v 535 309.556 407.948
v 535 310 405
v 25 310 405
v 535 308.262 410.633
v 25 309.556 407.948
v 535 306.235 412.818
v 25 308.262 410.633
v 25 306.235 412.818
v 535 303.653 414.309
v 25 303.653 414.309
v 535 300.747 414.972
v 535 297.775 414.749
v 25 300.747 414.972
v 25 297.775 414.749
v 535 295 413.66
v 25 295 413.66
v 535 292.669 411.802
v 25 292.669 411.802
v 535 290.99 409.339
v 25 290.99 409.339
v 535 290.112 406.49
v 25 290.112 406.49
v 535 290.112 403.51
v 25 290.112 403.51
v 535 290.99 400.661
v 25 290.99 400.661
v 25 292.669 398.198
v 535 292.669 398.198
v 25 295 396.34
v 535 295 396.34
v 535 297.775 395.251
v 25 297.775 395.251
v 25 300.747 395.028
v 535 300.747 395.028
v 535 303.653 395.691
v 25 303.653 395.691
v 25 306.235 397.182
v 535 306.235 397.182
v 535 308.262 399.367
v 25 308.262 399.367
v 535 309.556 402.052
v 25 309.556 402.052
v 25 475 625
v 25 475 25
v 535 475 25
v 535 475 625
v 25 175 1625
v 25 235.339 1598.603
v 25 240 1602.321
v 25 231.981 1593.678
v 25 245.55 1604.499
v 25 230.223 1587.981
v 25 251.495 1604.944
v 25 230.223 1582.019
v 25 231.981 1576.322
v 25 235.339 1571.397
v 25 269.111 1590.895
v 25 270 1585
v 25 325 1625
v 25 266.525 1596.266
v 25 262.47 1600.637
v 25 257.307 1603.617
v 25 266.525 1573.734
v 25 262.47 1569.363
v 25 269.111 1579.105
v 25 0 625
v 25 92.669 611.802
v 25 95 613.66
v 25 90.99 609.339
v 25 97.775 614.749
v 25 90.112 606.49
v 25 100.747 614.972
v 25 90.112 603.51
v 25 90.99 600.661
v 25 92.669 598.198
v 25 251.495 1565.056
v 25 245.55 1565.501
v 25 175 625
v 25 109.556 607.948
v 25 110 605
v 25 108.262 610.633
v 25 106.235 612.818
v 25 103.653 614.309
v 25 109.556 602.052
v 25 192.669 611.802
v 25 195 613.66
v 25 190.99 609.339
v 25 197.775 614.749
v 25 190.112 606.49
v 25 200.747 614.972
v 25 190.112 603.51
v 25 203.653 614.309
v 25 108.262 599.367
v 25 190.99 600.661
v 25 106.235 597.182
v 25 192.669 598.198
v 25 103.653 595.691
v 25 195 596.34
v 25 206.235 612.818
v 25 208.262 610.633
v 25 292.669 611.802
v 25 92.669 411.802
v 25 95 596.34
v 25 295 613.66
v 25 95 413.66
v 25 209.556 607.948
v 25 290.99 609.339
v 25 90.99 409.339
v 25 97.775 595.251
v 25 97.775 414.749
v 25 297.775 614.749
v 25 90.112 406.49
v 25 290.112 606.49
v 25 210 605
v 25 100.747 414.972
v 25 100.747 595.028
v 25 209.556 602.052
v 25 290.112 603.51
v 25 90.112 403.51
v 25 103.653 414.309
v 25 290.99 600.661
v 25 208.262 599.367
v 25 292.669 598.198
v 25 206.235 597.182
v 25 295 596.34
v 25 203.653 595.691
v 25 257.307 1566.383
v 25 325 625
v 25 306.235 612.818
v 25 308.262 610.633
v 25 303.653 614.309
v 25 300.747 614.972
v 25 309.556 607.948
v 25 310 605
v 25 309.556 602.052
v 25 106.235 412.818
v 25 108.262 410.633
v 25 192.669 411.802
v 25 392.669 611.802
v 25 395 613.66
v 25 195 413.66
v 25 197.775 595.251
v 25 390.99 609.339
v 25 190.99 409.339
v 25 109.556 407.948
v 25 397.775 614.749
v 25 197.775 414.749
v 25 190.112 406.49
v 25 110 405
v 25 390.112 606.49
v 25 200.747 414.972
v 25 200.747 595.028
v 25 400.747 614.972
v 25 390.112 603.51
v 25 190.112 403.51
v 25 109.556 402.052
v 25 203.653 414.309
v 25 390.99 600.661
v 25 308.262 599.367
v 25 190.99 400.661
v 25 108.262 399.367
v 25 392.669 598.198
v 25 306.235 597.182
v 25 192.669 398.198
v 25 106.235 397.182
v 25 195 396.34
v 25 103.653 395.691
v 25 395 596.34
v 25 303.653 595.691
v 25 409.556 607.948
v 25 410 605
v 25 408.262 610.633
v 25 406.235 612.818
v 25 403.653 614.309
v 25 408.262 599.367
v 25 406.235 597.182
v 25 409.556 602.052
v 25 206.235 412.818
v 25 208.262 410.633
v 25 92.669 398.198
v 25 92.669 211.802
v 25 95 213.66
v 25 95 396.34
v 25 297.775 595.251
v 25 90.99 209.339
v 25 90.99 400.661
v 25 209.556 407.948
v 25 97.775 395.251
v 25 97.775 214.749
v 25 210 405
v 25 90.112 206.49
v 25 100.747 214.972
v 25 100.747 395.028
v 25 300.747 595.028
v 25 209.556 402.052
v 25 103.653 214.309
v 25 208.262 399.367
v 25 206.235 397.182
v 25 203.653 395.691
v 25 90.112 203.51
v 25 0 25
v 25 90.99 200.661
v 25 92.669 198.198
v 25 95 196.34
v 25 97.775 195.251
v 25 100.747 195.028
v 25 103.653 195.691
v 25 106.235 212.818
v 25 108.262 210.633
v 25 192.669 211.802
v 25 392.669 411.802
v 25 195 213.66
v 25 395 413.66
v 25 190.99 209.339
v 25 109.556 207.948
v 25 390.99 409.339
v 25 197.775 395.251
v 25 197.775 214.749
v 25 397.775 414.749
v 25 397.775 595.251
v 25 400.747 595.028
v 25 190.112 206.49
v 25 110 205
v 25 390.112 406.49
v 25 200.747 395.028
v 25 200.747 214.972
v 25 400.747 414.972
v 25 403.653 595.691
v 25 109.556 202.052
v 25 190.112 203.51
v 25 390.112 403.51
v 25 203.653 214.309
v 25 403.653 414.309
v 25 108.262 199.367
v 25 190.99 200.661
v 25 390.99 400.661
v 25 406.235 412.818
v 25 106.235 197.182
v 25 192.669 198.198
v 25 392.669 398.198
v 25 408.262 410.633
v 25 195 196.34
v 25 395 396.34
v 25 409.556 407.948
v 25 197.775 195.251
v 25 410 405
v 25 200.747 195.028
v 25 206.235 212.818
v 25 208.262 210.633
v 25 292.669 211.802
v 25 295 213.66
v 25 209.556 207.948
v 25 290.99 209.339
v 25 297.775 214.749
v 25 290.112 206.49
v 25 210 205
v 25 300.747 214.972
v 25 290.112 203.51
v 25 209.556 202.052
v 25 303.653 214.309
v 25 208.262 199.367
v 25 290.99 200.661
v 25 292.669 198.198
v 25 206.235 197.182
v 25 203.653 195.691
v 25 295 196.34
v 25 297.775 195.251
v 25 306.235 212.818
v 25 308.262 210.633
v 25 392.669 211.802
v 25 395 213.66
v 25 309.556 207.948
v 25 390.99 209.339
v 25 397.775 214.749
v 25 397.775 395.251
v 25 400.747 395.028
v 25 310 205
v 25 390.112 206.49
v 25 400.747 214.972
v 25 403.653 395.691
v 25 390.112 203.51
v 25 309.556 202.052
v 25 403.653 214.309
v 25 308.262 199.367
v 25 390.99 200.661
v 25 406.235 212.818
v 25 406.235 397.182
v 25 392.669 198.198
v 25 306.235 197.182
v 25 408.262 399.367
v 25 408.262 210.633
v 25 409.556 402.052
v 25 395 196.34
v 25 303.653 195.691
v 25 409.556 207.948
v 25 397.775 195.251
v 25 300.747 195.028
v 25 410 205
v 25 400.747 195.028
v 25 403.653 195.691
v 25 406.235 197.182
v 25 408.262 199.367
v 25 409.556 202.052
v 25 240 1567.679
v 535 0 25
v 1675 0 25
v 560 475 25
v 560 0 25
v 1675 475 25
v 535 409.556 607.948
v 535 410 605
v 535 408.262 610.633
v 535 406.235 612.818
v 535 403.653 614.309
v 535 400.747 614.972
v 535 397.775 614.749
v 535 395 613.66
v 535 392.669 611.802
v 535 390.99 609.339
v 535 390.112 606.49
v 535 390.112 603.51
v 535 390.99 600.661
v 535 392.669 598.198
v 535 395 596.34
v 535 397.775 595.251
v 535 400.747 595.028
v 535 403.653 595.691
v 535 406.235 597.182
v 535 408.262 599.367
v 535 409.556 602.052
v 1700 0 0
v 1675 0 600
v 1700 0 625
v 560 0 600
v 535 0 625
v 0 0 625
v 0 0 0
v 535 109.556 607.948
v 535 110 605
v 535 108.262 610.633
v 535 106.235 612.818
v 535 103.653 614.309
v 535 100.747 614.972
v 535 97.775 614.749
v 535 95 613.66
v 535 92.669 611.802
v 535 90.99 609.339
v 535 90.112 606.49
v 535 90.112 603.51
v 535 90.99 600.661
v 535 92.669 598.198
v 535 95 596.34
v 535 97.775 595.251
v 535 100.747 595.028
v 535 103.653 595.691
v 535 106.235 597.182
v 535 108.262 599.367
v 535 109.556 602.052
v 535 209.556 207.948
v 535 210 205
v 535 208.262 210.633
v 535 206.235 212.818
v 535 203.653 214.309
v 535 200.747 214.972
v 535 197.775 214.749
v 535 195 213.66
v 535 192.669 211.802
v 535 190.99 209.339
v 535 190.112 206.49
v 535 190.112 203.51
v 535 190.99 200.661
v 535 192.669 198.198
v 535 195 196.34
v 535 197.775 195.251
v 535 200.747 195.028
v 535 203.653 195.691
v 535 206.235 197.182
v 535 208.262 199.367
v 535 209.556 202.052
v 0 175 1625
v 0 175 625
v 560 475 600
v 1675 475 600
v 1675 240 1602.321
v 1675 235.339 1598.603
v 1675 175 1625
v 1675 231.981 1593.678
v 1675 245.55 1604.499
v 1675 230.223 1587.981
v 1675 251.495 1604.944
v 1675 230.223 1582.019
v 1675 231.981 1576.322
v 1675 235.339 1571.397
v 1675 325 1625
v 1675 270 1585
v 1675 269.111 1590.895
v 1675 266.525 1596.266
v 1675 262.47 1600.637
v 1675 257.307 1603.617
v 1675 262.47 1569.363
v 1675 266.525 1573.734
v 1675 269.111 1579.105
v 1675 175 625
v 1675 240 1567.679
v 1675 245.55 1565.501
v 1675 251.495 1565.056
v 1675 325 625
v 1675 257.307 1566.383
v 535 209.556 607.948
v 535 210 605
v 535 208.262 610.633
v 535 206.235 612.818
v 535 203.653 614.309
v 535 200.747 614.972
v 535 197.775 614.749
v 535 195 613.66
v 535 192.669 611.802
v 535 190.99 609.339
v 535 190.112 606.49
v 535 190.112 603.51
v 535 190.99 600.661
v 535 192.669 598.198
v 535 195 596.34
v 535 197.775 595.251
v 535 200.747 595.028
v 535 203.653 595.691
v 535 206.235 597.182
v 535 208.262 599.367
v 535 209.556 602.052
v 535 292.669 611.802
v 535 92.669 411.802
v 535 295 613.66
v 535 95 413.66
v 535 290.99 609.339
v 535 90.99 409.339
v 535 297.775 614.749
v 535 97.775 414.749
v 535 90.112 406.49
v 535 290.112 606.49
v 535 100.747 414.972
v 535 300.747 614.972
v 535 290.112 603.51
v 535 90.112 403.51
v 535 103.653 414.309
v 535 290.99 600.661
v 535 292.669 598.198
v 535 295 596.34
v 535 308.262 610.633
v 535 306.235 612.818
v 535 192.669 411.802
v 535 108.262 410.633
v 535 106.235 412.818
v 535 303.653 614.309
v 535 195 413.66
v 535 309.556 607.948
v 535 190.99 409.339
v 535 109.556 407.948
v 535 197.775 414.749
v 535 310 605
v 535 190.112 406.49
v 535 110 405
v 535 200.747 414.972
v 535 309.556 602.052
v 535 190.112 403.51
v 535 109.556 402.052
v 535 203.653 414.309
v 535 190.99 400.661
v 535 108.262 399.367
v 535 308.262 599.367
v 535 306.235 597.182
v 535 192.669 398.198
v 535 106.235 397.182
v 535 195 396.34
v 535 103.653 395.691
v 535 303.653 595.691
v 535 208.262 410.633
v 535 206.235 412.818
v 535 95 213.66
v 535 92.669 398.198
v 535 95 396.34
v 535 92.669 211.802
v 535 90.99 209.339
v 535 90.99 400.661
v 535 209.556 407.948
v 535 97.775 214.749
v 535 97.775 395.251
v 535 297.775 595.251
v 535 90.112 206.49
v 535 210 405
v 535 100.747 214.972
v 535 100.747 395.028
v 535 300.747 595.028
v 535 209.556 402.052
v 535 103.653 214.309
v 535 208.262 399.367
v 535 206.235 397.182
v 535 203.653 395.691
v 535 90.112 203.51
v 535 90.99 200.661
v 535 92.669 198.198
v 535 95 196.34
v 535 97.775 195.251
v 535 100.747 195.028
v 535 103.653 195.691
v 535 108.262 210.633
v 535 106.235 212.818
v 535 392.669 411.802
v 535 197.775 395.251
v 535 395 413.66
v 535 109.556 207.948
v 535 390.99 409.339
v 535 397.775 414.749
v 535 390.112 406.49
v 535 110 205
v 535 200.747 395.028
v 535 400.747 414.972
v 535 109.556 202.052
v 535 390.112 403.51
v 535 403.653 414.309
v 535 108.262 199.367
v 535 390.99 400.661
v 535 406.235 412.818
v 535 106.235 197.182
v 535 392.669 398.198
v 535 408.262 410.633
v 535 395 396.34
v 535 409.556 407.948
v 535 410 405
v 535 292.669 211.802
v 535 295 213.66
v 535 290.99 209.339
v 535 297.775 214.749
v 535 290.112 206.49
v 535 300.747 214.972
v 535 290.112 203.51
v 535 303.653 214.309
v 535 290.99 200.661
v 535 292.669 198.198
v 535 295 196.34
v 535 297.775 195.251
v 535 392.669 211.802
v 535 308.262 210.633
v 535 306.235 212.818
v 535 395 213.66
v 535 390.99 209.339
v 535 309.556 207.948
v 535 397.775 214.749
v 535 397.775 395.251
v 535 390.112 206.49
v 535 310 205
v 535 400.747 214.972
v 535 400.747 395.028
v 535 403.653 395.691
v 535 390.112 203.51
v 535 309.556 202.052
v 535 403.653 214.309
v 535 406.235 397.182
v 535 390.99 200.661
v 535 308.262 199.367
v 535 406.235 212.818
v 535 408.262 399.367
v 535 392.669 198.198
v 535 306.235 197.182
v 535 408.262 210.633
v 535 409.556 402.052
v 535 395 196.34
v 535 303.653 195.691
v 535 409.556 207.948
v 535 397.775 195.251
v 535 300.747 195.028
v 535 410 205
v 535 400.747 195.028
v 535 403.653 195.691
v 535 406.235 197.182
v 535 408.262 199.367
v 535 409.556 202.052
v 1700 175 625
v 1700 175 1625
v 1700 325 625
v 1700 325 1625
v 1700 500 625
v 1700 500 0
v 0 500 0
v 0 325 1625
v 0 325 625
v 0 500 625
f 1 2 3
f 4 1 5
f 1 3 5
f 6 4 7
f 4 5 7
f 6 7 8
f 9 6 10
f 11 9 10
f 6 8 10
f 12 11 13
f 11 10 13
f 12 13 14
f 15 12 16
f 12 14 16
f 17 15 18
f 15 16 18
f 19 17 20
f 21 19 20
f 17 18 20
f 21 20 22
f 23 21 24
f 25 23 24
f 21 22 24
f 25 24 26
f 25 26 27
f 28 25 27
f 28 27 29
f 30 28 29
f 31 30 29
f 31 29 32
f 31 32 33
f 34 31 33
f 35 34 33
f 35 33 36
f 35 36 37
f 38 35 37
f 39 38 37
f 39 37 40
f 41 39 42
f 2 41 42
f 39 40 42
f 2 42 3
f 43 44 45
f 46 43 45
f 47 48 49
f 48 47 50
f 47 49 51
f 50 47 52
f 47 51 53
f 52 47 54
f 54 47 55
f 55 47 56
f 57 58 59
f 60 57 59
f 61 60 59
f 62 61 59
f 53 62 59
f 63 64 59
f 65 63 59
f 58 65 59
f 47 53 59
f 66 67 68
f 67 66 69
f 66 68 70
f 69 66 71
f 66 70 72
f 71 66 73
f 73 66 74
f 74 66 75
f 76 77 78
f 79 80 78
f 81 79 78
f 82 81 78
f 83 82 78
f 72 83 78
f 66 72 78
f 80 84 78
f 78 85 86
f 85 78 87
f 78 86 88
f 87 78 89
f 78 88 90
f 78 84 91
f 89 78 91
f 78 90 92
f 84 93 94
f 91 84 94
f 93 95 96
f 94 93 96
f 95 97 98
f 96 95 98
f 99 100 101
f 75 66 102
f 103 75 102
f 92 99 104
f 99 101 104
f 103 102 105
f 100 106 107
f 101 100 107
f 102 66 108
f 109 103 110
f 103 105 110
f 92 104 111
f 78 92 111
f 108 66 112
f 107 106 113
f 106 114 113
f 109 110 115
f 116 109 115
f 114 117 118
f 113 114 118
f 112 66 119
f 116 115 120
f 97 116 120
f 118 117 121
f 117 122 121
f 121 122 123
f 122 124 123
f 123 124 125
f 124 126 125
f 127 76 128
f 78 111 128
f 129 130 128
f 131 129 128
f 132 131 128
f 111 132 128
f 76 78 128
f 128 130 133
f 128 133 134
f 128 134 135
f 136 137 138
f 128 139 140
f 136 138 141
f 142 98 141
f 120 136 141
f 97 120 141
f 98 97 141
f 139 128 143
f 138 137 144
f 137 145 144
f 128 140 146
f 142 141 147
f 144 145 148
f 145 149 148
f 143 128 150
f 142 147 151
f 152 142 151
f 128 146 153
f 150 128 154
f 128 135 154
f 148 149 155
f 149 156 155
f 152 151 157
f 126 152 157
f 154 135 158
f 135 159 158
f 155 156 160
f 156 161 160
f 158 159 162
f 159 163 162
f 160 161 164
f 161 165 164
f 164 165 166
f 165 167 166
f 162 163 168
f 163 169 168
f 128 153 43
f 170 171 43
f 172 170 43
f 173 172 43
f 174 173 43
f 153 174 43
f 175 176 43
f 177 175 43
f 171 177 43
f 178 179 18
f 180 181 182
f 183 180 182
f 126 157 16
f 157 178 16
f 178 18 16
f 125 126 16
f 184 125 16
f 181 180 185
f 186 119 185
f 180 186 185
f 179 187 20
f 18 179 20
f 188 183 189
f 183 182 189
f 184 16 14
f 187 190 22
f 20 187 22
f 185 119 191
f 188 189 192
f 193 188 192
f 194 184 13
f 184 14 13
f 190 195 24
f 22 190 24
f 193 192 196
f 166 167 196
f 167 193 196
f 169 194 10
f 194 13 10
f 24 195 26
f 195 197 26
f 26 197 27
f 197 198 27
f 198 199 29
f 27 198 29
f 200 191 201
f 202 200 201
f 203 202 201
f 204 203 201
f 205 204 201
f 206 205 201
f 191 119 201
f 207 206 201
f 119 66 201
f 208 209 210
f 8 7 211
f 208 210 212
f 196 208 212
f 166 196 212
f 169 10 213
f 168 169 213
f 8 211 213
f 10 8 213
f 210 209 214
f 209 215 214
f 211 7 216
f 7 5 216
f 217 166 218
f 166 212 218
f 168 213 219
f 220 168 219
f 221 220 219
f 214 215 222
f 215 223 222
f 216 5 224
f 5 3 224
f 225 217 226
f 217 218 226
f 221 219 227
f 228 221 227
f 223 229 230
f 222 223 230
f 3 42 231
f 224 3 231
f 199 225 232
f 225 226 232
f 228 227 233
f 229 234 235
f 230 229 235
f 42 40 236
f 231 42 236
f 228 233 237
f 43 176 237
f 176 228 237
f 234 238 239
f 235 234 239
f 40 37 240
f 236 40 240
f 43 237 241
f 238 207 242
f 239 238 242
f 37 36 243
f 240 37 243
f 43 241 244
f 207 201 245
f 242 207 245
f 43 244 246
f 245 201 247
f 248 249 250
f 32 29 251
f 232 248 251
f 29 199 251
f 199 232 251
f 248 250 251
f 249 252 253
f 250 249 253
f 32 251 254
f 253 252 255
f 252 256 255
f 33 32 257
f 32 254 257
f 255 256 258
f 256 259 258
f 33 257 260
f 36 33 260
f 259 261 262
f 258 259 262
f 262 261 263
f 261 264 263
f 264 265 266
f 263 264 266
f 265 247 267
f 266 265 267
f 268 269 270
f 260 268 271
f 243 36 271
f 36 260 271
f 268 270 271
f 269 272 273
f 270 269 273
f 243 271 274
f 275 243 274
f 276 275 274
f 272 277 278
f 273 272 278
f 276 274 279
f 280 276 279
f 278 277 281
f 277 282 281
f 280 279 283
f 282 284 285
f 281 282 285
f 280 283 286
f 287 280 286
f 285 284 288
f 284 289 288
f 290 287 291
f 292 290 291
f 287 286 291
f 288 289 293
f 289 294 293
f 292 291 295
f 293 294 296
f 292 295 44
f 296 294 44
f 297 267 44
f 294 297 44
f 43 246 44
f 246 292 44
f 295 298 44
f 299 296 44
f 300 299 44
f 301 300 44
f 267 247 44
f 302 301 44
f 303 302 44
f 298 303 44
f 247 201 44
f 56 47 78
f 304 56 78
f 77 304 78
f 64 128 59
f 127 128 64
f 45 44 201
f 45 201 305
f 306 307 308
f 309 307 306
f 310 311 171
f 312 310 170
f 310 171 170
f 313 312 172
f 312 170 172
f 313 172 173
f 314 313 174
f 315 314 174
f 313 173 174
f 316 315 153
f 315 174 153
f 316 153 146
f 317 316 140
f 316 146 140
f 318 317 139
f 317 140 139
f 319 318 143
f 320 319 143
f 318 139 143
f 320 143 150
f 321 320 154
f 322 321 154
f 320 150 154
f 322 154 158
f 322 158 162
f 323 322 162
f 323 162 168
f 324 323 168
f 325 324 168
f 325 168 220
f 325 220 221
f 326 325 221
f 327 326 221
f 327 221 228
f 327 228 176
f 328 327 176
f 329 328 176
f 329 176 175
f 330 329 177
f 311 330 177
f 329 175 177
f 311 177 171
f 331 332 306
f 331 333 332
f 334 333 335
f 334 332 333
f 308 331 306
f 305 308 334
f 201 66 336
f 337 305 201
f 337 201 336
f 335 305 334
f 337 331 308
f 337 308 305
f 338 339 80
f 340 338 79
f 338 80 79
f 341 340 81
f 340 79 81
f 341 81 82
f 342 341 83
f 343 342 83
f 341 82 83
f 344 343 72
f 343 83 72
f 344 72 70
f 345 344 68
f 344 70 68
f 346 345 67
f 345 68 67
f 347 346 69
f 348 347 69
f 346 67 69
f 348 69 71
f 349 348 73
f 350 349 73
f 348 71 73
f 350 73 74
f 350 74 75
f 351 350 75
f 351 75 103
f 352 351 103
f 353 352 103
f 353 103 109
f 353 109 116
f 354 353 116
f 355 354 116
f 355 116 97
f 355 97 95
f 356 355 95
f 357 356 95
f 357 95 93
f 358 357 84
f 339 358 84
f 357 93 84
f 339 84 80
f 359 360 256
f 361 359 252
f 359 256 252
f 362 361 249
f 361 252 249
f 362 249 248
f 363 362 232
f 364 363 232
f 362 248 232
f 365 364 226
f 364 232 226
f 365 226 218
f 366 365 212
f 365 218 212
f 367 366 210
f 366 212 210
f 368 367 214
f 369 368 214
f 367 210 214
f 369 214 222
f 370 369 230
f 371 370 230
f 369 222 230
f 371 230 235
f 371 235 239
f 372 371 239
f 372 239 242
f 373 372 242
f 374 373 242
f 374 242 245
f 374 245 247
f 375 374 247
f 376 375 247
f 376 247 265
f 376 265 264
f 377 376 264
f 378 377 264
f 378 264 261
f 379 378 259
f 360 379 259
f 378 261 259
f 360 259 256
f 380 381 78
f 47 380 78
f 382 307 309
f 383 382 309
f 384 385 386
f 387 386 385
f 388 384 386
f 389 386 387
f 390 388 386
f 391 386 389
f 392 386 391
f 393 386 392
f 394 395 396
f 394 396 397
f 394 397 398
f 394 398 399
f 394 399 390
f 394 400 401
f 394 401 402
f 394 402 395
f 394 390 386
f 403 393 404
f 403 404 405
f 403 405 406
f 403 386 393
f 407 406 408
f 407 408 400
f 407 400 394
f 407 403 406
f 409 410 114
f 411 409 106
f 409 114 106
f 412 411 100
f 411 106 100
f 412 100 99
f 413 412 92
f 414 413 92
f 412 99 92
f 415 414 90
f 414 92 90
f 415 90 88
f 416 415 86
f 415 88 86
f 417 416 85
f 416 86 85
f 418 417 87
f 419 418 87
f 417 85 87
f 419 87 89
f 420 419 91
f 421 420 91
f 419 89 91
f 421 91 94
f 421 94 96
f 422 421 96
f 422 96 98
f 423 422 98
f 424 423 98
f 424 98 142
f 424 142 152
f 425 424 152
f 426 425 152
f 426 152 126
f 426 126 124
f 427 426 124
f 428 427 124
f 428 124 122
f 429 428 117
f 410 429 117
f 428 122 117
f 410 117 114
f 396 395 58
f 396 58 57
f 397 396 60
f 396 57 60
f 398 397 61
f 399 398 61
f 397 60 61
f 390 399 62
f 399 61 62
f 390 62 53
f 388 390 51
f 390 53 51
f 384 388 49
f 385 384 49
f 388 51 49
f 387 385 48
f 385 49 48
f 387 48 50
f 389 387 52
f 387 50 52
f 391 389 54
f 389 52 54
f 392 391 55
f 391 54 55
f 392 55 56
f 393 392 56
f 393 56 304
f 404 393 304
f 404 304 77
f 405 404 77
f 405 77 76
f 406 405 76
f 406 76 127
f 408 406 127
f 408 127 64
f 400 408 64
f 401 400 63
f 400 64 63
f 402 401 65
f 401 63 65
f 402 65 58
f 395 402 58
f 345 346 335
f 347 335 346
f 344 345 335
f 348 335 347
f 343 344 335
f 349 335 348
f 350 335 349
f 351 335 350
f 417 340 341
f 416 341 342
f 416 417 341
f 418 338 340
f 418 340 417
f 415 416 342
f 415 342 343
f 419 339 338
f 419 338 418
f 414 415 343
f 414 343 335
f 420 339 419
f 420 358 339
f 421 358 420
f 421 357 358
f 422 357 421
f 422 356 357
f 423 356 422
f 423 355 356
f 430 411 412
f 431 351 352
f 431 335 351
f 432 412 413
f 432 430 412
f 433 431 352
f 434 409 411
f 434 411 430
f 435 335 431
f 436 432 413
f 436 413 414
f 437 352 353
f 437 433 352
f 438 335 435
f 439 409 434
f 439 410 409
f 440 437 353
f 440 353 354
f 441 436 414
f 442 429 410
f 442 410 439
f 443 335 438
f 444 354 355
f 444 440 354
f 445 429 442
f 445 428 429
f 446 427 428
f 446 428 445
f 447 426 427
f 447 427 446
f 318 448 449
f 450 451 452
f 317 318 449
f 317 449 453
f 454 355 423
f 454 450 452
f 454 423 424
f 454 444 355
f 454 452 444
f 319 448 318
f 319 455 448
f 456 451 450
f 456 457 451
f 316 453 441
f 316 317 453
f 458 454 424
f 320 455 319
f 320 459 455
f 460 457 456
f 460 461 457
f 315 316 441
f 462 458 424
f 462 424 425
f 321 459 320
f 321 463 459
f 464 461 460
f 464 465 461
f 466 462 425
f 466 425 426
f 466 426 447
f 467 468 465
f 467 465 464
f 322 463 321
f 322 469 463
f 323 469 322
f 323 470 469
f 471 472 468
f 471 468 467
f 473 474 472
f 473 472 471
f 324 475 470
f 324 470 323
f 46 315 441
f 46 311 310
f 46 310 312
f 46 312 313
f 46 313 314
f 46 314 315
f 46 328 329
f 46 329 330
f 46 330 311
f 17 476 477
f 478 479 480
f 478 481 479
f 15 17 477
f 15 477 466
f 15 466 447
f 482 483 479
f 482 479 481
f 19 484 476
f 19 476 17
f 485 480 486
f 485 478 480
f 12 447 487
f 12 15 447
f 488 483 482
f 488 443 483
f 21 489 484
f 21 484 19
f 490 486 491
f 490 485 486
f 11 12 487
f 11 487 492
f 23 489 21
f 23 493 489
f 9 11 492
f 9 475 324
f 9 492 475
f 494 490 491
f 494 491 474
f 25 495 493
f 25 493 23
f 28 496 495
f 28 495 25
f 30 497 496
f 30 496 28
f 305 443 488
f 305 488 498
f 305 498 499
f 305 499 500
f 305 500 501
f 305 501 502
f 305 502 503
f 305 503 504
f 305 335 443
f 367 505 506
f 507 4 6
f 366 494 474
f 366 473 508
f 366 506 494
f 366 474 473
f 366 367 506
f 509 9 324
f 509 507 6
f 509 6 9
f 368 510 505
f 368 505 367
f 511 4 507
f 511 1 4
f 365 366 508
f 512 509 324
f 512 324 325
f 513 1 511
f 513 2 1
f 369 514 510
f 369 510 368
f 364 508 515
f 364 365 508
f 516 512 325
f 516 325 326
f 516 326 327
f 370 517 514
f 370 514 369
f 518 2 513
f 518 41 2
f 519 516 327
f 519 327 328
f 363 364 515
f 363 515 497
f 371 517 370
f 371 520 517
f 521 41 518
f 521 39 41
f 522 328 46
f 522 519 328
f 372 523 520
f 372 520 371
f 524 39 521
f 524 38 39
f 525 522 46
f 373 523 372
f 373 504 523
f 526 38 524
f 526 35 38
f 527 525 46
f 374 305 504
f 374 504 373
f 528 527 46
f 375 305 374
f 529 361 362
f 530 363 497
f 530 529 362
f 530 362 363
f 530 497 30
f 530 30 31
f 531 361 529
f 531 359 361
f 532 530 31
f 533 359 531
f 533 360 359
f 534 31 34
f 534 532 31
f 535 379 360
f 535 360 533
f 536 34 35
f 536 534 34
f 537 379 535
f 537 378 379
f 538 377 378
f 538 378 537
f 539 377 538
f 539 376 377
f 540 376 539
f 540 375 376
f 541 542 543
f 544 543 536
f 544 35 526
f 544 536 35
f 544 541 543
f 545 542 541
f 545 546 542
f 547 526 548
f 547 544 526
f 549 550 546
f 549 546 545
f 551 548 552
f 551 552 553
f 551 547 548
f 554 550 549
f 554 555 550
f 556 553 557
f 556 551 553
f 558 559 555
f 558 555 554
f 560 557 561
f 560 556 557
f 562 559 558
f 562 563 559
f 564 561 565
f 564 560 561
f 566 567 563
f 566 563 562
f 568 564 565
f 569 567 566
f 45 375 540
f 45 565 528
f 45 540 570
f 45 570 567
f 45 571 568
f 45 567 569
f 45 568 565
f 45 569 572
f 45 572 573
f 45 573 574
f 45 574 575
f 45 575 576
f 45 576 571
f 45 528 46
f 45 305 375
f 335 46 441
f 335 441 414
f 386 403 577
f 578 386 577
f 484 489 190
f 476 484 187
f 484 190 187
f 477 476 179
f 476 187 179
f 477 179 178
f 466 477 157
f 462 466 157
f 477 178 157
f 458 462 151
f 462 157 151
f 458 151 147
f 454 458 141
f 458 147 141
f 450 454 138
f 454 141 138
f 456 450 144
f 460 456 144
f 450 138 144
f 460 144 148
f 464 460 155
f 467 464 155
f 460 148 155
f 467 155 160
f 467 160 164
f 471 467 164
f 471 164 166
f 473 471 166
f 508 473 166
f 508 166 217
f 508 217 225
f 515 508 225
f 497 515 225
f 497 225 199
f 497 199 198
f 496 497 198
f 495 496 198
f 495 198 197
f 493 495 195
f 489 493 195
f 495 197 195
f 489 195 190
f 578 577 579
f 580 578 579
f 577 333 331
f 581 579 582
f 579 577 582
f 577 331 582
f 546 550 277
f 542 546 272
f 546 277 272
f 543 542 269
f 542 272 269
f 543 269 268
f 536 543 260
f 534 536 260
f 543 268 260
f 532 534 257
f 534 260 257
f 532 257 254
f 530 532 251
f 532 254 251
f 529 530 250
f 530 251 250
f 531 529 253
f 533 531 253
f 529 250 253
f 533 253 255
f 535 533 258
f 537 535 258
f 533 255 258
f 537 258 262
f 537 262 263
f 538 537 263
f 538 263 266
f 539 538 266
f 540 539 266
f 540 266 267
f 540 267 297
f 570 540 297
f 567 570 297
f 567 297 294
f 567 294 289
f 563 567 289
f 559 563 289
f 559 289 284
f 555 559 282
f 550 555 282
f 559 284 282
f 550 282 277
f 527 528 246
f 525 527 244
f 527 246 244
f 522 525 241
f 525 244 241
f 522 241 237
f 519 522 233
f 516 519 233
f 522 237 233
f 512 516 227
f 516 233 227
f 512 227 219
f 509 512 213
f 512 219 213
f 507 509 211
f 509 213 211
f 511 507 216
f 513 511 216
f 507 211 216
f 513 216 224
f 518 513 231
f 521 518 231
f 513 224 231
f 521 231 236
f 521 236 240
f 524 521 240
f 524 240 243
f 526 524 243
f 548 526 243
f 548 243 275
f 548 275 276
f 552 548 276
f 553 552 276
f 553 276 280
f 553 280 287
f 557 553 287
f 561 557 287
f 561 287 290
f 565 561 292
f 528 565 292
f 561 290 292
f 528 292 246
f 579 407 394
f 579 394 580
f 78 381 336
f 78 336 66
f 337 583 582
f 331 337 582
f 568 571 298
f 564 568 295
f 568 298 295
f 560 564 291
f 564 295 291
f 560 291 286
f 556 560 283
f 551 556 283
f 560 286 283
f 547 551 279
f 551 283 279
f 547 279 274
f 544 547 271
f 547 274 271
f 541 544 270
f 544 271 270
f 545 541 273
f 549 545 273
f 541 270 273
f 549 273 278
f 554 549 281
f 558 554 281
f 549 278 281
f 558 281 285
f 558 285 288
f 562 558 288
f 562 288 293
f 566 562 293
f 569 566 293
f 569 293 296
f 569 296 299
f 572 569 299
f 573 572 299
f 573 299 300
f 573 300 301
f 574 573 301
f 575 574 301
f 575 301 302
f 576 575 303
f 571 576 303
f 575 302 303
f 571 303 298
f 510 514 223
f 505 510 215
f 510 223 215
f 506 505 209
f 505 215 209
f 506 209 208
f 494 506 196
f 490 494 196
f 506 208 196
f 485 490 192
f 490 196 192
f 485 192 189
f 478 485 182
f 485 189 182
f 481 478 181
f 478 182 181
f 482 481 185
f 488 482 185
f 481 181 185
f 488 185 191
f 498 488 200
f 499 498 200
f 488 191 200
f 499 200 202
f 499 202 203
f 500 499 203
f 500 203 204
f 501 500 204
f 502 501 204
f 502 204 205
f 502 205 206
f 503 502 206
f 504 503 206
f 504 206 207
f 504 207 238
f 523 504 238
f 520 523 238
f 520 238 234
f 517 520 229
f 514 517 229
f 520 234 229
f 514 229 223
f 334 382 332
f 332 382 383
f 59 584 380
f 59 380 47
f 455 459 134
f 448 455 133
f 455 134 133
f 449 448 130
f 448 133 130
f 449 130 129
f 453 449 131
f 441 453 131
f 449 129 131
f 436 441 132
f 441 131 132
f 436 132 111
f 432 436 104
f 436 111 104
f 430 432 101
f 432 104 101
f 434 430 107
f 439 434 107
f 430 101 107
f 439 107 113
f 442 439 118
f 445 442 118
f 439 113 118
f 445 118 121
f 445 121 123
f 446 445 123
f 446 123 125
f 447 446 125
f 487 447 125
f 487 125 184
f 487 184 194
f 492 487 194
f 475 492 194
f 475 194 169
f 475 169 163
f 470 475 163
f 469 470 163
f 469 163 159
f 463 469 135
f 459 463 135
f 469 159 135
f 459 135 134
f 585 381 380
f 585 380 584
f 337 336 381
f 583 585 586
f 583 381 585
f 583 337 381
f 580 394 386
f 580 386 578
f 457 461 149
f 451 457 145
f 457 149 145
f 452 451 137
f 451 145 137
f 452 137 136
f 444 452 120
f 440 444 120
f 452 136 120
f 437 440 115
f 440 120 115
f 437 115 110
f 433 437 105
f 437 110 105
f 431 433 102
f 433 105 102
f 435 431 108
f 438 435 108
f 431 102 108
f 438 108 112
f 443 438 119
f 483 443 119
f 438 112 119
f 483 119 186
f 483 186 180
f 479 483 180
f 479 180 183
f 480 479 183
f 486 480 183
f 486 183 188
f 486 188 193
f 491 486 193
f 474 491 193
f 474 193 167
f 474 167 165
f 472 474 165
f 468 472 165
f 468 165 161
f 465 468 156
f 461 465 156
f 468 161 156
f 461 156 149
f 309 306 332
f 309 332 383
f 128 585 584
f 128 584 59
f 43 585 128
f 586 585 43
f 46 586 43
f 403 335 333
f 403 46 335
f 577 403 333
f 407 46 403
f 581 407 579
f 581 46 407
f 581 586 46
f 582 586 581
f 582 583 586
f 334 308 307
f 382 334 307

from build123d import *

# Parameters (mm, degrees)
F0_W      = 1700
F0_H      = 500
F1_DEPTH  = 25
F2_W      = 25
F2_H      = 500
F3_DEPTH  = 600
F6_W      = 1650
F6_H      = 25
F7_DEPTH  = 600
F8_W      = 25
F8_H      = 475
F9_DEPTH  = 600
F10_W     = 1165
F10_H     = 500
F11_DEPTH = 25
F12_R     = 10
F13_DEPTH = 510
F14_W     = 25
F14_H     = 150
F15_DEPTH = 1000
F16_W     = 25
F16_H     = 150
F17_DEPTH = 1000
F18_R     = 20
F19_DEPTH = 1650


with BuildPart() as f1:
    # F0 (on Top) → F1 (new body)
    with BuildSketch(Plane.XY):
        with Locations((850, 250)):
            Rectangle(F0_W, F0_H)
    extrude(amount=F1_DEPTH)

    # F2 (on face) → F3 (join)
    with BuildSketch(Plane.XY.offset(25)):
        with Locations((12.5, 250)):
            Rectangle(F2_W, F2_H)
    extrude(amount=F3_DEPTH)

    # F5: F1 across plane


with BuildPart() as f1_1:
    add(f1.part)
    add(f1.part.mirror(Plane.YZ.offset(850)))

    # F6 (on face) → F7 (join, through all)
    with BuildSketch(Plane.XY.offset(25)):
        with Locations((850, 487.5)):
            Rectangle(F6_W, F6_H)
    extrude(amount=F7_DEPTH)

    # F8 (on face) → F9 (join, through all)
    with BuildSketch(Plane.XY.offset(25)):
        with Locations((547.5, 237.5)):
            Rectangle(F8_W, F8_H)
    extrude(amount=F9_DEPTH)

    # F10 (on face) → F11 (join)
    with BuildSketch(Plane.XY.offset(625)):
        with Locations((1117.5, 250)):
            Rectangle(F10_W, F10_H)
    extrude(amount=-F11_DEPTH)

    # F12 (on face) → F13 (join, through all)
    with BuildSketch(Plane.YZ.offset(25)):
        with Locations((100, 605)):
            Circle(F12_R)
        with Locations((100, 205)):
            Circle(F12_R)
        with Locations((100, 405)):
            Circle(F12_R)
        with Locations((200, 605)):
            Circle(F12_R)
        with Locations((200, 405)):
            Circle(F12_R)
        with Locations((200, 205)):
            Circle(F12_R)
        with Locations((300, 605)):
            Circle(F12_R)
        with Locations((300, 405)):
            Circle(F12_R)
        with Locations((300, 205)):
            Circle(F12_R)
        with Locations((400, 605)):
            Circle(F12_R)
        with Locations((400, 405)):
            Circle(F12_R)
        with Locations((400, 205)):
            Circle(F12_R)
    extrude(amount=F13_DEPTH)

    # F14 (on face) → F15 (join)
    with BuildSketch(Plane.XY.offset(625)):
        with Locations((12.5, 250)):
            Rectangle(F14_W, F14_H)
    extrude(amount=F15_DEPTH)

    # F16 (on face) → F17 (join)
    with BuildSketch(Plane.XY.offset(625)):
        with Locations((1687.5, 250)):
            Rectangle(F16_W, F16_H)
    extrude(amount=F17_DEPTH)

    # F18 (on face) → F19 (join, through all)
    with BuildSketch(Plane.YZ.offset(25)):
        with Locations((250, 1585)):
            Circle(F18_R)
    extrude(amount=F19_DEPTH)


solid = f1_1.part
